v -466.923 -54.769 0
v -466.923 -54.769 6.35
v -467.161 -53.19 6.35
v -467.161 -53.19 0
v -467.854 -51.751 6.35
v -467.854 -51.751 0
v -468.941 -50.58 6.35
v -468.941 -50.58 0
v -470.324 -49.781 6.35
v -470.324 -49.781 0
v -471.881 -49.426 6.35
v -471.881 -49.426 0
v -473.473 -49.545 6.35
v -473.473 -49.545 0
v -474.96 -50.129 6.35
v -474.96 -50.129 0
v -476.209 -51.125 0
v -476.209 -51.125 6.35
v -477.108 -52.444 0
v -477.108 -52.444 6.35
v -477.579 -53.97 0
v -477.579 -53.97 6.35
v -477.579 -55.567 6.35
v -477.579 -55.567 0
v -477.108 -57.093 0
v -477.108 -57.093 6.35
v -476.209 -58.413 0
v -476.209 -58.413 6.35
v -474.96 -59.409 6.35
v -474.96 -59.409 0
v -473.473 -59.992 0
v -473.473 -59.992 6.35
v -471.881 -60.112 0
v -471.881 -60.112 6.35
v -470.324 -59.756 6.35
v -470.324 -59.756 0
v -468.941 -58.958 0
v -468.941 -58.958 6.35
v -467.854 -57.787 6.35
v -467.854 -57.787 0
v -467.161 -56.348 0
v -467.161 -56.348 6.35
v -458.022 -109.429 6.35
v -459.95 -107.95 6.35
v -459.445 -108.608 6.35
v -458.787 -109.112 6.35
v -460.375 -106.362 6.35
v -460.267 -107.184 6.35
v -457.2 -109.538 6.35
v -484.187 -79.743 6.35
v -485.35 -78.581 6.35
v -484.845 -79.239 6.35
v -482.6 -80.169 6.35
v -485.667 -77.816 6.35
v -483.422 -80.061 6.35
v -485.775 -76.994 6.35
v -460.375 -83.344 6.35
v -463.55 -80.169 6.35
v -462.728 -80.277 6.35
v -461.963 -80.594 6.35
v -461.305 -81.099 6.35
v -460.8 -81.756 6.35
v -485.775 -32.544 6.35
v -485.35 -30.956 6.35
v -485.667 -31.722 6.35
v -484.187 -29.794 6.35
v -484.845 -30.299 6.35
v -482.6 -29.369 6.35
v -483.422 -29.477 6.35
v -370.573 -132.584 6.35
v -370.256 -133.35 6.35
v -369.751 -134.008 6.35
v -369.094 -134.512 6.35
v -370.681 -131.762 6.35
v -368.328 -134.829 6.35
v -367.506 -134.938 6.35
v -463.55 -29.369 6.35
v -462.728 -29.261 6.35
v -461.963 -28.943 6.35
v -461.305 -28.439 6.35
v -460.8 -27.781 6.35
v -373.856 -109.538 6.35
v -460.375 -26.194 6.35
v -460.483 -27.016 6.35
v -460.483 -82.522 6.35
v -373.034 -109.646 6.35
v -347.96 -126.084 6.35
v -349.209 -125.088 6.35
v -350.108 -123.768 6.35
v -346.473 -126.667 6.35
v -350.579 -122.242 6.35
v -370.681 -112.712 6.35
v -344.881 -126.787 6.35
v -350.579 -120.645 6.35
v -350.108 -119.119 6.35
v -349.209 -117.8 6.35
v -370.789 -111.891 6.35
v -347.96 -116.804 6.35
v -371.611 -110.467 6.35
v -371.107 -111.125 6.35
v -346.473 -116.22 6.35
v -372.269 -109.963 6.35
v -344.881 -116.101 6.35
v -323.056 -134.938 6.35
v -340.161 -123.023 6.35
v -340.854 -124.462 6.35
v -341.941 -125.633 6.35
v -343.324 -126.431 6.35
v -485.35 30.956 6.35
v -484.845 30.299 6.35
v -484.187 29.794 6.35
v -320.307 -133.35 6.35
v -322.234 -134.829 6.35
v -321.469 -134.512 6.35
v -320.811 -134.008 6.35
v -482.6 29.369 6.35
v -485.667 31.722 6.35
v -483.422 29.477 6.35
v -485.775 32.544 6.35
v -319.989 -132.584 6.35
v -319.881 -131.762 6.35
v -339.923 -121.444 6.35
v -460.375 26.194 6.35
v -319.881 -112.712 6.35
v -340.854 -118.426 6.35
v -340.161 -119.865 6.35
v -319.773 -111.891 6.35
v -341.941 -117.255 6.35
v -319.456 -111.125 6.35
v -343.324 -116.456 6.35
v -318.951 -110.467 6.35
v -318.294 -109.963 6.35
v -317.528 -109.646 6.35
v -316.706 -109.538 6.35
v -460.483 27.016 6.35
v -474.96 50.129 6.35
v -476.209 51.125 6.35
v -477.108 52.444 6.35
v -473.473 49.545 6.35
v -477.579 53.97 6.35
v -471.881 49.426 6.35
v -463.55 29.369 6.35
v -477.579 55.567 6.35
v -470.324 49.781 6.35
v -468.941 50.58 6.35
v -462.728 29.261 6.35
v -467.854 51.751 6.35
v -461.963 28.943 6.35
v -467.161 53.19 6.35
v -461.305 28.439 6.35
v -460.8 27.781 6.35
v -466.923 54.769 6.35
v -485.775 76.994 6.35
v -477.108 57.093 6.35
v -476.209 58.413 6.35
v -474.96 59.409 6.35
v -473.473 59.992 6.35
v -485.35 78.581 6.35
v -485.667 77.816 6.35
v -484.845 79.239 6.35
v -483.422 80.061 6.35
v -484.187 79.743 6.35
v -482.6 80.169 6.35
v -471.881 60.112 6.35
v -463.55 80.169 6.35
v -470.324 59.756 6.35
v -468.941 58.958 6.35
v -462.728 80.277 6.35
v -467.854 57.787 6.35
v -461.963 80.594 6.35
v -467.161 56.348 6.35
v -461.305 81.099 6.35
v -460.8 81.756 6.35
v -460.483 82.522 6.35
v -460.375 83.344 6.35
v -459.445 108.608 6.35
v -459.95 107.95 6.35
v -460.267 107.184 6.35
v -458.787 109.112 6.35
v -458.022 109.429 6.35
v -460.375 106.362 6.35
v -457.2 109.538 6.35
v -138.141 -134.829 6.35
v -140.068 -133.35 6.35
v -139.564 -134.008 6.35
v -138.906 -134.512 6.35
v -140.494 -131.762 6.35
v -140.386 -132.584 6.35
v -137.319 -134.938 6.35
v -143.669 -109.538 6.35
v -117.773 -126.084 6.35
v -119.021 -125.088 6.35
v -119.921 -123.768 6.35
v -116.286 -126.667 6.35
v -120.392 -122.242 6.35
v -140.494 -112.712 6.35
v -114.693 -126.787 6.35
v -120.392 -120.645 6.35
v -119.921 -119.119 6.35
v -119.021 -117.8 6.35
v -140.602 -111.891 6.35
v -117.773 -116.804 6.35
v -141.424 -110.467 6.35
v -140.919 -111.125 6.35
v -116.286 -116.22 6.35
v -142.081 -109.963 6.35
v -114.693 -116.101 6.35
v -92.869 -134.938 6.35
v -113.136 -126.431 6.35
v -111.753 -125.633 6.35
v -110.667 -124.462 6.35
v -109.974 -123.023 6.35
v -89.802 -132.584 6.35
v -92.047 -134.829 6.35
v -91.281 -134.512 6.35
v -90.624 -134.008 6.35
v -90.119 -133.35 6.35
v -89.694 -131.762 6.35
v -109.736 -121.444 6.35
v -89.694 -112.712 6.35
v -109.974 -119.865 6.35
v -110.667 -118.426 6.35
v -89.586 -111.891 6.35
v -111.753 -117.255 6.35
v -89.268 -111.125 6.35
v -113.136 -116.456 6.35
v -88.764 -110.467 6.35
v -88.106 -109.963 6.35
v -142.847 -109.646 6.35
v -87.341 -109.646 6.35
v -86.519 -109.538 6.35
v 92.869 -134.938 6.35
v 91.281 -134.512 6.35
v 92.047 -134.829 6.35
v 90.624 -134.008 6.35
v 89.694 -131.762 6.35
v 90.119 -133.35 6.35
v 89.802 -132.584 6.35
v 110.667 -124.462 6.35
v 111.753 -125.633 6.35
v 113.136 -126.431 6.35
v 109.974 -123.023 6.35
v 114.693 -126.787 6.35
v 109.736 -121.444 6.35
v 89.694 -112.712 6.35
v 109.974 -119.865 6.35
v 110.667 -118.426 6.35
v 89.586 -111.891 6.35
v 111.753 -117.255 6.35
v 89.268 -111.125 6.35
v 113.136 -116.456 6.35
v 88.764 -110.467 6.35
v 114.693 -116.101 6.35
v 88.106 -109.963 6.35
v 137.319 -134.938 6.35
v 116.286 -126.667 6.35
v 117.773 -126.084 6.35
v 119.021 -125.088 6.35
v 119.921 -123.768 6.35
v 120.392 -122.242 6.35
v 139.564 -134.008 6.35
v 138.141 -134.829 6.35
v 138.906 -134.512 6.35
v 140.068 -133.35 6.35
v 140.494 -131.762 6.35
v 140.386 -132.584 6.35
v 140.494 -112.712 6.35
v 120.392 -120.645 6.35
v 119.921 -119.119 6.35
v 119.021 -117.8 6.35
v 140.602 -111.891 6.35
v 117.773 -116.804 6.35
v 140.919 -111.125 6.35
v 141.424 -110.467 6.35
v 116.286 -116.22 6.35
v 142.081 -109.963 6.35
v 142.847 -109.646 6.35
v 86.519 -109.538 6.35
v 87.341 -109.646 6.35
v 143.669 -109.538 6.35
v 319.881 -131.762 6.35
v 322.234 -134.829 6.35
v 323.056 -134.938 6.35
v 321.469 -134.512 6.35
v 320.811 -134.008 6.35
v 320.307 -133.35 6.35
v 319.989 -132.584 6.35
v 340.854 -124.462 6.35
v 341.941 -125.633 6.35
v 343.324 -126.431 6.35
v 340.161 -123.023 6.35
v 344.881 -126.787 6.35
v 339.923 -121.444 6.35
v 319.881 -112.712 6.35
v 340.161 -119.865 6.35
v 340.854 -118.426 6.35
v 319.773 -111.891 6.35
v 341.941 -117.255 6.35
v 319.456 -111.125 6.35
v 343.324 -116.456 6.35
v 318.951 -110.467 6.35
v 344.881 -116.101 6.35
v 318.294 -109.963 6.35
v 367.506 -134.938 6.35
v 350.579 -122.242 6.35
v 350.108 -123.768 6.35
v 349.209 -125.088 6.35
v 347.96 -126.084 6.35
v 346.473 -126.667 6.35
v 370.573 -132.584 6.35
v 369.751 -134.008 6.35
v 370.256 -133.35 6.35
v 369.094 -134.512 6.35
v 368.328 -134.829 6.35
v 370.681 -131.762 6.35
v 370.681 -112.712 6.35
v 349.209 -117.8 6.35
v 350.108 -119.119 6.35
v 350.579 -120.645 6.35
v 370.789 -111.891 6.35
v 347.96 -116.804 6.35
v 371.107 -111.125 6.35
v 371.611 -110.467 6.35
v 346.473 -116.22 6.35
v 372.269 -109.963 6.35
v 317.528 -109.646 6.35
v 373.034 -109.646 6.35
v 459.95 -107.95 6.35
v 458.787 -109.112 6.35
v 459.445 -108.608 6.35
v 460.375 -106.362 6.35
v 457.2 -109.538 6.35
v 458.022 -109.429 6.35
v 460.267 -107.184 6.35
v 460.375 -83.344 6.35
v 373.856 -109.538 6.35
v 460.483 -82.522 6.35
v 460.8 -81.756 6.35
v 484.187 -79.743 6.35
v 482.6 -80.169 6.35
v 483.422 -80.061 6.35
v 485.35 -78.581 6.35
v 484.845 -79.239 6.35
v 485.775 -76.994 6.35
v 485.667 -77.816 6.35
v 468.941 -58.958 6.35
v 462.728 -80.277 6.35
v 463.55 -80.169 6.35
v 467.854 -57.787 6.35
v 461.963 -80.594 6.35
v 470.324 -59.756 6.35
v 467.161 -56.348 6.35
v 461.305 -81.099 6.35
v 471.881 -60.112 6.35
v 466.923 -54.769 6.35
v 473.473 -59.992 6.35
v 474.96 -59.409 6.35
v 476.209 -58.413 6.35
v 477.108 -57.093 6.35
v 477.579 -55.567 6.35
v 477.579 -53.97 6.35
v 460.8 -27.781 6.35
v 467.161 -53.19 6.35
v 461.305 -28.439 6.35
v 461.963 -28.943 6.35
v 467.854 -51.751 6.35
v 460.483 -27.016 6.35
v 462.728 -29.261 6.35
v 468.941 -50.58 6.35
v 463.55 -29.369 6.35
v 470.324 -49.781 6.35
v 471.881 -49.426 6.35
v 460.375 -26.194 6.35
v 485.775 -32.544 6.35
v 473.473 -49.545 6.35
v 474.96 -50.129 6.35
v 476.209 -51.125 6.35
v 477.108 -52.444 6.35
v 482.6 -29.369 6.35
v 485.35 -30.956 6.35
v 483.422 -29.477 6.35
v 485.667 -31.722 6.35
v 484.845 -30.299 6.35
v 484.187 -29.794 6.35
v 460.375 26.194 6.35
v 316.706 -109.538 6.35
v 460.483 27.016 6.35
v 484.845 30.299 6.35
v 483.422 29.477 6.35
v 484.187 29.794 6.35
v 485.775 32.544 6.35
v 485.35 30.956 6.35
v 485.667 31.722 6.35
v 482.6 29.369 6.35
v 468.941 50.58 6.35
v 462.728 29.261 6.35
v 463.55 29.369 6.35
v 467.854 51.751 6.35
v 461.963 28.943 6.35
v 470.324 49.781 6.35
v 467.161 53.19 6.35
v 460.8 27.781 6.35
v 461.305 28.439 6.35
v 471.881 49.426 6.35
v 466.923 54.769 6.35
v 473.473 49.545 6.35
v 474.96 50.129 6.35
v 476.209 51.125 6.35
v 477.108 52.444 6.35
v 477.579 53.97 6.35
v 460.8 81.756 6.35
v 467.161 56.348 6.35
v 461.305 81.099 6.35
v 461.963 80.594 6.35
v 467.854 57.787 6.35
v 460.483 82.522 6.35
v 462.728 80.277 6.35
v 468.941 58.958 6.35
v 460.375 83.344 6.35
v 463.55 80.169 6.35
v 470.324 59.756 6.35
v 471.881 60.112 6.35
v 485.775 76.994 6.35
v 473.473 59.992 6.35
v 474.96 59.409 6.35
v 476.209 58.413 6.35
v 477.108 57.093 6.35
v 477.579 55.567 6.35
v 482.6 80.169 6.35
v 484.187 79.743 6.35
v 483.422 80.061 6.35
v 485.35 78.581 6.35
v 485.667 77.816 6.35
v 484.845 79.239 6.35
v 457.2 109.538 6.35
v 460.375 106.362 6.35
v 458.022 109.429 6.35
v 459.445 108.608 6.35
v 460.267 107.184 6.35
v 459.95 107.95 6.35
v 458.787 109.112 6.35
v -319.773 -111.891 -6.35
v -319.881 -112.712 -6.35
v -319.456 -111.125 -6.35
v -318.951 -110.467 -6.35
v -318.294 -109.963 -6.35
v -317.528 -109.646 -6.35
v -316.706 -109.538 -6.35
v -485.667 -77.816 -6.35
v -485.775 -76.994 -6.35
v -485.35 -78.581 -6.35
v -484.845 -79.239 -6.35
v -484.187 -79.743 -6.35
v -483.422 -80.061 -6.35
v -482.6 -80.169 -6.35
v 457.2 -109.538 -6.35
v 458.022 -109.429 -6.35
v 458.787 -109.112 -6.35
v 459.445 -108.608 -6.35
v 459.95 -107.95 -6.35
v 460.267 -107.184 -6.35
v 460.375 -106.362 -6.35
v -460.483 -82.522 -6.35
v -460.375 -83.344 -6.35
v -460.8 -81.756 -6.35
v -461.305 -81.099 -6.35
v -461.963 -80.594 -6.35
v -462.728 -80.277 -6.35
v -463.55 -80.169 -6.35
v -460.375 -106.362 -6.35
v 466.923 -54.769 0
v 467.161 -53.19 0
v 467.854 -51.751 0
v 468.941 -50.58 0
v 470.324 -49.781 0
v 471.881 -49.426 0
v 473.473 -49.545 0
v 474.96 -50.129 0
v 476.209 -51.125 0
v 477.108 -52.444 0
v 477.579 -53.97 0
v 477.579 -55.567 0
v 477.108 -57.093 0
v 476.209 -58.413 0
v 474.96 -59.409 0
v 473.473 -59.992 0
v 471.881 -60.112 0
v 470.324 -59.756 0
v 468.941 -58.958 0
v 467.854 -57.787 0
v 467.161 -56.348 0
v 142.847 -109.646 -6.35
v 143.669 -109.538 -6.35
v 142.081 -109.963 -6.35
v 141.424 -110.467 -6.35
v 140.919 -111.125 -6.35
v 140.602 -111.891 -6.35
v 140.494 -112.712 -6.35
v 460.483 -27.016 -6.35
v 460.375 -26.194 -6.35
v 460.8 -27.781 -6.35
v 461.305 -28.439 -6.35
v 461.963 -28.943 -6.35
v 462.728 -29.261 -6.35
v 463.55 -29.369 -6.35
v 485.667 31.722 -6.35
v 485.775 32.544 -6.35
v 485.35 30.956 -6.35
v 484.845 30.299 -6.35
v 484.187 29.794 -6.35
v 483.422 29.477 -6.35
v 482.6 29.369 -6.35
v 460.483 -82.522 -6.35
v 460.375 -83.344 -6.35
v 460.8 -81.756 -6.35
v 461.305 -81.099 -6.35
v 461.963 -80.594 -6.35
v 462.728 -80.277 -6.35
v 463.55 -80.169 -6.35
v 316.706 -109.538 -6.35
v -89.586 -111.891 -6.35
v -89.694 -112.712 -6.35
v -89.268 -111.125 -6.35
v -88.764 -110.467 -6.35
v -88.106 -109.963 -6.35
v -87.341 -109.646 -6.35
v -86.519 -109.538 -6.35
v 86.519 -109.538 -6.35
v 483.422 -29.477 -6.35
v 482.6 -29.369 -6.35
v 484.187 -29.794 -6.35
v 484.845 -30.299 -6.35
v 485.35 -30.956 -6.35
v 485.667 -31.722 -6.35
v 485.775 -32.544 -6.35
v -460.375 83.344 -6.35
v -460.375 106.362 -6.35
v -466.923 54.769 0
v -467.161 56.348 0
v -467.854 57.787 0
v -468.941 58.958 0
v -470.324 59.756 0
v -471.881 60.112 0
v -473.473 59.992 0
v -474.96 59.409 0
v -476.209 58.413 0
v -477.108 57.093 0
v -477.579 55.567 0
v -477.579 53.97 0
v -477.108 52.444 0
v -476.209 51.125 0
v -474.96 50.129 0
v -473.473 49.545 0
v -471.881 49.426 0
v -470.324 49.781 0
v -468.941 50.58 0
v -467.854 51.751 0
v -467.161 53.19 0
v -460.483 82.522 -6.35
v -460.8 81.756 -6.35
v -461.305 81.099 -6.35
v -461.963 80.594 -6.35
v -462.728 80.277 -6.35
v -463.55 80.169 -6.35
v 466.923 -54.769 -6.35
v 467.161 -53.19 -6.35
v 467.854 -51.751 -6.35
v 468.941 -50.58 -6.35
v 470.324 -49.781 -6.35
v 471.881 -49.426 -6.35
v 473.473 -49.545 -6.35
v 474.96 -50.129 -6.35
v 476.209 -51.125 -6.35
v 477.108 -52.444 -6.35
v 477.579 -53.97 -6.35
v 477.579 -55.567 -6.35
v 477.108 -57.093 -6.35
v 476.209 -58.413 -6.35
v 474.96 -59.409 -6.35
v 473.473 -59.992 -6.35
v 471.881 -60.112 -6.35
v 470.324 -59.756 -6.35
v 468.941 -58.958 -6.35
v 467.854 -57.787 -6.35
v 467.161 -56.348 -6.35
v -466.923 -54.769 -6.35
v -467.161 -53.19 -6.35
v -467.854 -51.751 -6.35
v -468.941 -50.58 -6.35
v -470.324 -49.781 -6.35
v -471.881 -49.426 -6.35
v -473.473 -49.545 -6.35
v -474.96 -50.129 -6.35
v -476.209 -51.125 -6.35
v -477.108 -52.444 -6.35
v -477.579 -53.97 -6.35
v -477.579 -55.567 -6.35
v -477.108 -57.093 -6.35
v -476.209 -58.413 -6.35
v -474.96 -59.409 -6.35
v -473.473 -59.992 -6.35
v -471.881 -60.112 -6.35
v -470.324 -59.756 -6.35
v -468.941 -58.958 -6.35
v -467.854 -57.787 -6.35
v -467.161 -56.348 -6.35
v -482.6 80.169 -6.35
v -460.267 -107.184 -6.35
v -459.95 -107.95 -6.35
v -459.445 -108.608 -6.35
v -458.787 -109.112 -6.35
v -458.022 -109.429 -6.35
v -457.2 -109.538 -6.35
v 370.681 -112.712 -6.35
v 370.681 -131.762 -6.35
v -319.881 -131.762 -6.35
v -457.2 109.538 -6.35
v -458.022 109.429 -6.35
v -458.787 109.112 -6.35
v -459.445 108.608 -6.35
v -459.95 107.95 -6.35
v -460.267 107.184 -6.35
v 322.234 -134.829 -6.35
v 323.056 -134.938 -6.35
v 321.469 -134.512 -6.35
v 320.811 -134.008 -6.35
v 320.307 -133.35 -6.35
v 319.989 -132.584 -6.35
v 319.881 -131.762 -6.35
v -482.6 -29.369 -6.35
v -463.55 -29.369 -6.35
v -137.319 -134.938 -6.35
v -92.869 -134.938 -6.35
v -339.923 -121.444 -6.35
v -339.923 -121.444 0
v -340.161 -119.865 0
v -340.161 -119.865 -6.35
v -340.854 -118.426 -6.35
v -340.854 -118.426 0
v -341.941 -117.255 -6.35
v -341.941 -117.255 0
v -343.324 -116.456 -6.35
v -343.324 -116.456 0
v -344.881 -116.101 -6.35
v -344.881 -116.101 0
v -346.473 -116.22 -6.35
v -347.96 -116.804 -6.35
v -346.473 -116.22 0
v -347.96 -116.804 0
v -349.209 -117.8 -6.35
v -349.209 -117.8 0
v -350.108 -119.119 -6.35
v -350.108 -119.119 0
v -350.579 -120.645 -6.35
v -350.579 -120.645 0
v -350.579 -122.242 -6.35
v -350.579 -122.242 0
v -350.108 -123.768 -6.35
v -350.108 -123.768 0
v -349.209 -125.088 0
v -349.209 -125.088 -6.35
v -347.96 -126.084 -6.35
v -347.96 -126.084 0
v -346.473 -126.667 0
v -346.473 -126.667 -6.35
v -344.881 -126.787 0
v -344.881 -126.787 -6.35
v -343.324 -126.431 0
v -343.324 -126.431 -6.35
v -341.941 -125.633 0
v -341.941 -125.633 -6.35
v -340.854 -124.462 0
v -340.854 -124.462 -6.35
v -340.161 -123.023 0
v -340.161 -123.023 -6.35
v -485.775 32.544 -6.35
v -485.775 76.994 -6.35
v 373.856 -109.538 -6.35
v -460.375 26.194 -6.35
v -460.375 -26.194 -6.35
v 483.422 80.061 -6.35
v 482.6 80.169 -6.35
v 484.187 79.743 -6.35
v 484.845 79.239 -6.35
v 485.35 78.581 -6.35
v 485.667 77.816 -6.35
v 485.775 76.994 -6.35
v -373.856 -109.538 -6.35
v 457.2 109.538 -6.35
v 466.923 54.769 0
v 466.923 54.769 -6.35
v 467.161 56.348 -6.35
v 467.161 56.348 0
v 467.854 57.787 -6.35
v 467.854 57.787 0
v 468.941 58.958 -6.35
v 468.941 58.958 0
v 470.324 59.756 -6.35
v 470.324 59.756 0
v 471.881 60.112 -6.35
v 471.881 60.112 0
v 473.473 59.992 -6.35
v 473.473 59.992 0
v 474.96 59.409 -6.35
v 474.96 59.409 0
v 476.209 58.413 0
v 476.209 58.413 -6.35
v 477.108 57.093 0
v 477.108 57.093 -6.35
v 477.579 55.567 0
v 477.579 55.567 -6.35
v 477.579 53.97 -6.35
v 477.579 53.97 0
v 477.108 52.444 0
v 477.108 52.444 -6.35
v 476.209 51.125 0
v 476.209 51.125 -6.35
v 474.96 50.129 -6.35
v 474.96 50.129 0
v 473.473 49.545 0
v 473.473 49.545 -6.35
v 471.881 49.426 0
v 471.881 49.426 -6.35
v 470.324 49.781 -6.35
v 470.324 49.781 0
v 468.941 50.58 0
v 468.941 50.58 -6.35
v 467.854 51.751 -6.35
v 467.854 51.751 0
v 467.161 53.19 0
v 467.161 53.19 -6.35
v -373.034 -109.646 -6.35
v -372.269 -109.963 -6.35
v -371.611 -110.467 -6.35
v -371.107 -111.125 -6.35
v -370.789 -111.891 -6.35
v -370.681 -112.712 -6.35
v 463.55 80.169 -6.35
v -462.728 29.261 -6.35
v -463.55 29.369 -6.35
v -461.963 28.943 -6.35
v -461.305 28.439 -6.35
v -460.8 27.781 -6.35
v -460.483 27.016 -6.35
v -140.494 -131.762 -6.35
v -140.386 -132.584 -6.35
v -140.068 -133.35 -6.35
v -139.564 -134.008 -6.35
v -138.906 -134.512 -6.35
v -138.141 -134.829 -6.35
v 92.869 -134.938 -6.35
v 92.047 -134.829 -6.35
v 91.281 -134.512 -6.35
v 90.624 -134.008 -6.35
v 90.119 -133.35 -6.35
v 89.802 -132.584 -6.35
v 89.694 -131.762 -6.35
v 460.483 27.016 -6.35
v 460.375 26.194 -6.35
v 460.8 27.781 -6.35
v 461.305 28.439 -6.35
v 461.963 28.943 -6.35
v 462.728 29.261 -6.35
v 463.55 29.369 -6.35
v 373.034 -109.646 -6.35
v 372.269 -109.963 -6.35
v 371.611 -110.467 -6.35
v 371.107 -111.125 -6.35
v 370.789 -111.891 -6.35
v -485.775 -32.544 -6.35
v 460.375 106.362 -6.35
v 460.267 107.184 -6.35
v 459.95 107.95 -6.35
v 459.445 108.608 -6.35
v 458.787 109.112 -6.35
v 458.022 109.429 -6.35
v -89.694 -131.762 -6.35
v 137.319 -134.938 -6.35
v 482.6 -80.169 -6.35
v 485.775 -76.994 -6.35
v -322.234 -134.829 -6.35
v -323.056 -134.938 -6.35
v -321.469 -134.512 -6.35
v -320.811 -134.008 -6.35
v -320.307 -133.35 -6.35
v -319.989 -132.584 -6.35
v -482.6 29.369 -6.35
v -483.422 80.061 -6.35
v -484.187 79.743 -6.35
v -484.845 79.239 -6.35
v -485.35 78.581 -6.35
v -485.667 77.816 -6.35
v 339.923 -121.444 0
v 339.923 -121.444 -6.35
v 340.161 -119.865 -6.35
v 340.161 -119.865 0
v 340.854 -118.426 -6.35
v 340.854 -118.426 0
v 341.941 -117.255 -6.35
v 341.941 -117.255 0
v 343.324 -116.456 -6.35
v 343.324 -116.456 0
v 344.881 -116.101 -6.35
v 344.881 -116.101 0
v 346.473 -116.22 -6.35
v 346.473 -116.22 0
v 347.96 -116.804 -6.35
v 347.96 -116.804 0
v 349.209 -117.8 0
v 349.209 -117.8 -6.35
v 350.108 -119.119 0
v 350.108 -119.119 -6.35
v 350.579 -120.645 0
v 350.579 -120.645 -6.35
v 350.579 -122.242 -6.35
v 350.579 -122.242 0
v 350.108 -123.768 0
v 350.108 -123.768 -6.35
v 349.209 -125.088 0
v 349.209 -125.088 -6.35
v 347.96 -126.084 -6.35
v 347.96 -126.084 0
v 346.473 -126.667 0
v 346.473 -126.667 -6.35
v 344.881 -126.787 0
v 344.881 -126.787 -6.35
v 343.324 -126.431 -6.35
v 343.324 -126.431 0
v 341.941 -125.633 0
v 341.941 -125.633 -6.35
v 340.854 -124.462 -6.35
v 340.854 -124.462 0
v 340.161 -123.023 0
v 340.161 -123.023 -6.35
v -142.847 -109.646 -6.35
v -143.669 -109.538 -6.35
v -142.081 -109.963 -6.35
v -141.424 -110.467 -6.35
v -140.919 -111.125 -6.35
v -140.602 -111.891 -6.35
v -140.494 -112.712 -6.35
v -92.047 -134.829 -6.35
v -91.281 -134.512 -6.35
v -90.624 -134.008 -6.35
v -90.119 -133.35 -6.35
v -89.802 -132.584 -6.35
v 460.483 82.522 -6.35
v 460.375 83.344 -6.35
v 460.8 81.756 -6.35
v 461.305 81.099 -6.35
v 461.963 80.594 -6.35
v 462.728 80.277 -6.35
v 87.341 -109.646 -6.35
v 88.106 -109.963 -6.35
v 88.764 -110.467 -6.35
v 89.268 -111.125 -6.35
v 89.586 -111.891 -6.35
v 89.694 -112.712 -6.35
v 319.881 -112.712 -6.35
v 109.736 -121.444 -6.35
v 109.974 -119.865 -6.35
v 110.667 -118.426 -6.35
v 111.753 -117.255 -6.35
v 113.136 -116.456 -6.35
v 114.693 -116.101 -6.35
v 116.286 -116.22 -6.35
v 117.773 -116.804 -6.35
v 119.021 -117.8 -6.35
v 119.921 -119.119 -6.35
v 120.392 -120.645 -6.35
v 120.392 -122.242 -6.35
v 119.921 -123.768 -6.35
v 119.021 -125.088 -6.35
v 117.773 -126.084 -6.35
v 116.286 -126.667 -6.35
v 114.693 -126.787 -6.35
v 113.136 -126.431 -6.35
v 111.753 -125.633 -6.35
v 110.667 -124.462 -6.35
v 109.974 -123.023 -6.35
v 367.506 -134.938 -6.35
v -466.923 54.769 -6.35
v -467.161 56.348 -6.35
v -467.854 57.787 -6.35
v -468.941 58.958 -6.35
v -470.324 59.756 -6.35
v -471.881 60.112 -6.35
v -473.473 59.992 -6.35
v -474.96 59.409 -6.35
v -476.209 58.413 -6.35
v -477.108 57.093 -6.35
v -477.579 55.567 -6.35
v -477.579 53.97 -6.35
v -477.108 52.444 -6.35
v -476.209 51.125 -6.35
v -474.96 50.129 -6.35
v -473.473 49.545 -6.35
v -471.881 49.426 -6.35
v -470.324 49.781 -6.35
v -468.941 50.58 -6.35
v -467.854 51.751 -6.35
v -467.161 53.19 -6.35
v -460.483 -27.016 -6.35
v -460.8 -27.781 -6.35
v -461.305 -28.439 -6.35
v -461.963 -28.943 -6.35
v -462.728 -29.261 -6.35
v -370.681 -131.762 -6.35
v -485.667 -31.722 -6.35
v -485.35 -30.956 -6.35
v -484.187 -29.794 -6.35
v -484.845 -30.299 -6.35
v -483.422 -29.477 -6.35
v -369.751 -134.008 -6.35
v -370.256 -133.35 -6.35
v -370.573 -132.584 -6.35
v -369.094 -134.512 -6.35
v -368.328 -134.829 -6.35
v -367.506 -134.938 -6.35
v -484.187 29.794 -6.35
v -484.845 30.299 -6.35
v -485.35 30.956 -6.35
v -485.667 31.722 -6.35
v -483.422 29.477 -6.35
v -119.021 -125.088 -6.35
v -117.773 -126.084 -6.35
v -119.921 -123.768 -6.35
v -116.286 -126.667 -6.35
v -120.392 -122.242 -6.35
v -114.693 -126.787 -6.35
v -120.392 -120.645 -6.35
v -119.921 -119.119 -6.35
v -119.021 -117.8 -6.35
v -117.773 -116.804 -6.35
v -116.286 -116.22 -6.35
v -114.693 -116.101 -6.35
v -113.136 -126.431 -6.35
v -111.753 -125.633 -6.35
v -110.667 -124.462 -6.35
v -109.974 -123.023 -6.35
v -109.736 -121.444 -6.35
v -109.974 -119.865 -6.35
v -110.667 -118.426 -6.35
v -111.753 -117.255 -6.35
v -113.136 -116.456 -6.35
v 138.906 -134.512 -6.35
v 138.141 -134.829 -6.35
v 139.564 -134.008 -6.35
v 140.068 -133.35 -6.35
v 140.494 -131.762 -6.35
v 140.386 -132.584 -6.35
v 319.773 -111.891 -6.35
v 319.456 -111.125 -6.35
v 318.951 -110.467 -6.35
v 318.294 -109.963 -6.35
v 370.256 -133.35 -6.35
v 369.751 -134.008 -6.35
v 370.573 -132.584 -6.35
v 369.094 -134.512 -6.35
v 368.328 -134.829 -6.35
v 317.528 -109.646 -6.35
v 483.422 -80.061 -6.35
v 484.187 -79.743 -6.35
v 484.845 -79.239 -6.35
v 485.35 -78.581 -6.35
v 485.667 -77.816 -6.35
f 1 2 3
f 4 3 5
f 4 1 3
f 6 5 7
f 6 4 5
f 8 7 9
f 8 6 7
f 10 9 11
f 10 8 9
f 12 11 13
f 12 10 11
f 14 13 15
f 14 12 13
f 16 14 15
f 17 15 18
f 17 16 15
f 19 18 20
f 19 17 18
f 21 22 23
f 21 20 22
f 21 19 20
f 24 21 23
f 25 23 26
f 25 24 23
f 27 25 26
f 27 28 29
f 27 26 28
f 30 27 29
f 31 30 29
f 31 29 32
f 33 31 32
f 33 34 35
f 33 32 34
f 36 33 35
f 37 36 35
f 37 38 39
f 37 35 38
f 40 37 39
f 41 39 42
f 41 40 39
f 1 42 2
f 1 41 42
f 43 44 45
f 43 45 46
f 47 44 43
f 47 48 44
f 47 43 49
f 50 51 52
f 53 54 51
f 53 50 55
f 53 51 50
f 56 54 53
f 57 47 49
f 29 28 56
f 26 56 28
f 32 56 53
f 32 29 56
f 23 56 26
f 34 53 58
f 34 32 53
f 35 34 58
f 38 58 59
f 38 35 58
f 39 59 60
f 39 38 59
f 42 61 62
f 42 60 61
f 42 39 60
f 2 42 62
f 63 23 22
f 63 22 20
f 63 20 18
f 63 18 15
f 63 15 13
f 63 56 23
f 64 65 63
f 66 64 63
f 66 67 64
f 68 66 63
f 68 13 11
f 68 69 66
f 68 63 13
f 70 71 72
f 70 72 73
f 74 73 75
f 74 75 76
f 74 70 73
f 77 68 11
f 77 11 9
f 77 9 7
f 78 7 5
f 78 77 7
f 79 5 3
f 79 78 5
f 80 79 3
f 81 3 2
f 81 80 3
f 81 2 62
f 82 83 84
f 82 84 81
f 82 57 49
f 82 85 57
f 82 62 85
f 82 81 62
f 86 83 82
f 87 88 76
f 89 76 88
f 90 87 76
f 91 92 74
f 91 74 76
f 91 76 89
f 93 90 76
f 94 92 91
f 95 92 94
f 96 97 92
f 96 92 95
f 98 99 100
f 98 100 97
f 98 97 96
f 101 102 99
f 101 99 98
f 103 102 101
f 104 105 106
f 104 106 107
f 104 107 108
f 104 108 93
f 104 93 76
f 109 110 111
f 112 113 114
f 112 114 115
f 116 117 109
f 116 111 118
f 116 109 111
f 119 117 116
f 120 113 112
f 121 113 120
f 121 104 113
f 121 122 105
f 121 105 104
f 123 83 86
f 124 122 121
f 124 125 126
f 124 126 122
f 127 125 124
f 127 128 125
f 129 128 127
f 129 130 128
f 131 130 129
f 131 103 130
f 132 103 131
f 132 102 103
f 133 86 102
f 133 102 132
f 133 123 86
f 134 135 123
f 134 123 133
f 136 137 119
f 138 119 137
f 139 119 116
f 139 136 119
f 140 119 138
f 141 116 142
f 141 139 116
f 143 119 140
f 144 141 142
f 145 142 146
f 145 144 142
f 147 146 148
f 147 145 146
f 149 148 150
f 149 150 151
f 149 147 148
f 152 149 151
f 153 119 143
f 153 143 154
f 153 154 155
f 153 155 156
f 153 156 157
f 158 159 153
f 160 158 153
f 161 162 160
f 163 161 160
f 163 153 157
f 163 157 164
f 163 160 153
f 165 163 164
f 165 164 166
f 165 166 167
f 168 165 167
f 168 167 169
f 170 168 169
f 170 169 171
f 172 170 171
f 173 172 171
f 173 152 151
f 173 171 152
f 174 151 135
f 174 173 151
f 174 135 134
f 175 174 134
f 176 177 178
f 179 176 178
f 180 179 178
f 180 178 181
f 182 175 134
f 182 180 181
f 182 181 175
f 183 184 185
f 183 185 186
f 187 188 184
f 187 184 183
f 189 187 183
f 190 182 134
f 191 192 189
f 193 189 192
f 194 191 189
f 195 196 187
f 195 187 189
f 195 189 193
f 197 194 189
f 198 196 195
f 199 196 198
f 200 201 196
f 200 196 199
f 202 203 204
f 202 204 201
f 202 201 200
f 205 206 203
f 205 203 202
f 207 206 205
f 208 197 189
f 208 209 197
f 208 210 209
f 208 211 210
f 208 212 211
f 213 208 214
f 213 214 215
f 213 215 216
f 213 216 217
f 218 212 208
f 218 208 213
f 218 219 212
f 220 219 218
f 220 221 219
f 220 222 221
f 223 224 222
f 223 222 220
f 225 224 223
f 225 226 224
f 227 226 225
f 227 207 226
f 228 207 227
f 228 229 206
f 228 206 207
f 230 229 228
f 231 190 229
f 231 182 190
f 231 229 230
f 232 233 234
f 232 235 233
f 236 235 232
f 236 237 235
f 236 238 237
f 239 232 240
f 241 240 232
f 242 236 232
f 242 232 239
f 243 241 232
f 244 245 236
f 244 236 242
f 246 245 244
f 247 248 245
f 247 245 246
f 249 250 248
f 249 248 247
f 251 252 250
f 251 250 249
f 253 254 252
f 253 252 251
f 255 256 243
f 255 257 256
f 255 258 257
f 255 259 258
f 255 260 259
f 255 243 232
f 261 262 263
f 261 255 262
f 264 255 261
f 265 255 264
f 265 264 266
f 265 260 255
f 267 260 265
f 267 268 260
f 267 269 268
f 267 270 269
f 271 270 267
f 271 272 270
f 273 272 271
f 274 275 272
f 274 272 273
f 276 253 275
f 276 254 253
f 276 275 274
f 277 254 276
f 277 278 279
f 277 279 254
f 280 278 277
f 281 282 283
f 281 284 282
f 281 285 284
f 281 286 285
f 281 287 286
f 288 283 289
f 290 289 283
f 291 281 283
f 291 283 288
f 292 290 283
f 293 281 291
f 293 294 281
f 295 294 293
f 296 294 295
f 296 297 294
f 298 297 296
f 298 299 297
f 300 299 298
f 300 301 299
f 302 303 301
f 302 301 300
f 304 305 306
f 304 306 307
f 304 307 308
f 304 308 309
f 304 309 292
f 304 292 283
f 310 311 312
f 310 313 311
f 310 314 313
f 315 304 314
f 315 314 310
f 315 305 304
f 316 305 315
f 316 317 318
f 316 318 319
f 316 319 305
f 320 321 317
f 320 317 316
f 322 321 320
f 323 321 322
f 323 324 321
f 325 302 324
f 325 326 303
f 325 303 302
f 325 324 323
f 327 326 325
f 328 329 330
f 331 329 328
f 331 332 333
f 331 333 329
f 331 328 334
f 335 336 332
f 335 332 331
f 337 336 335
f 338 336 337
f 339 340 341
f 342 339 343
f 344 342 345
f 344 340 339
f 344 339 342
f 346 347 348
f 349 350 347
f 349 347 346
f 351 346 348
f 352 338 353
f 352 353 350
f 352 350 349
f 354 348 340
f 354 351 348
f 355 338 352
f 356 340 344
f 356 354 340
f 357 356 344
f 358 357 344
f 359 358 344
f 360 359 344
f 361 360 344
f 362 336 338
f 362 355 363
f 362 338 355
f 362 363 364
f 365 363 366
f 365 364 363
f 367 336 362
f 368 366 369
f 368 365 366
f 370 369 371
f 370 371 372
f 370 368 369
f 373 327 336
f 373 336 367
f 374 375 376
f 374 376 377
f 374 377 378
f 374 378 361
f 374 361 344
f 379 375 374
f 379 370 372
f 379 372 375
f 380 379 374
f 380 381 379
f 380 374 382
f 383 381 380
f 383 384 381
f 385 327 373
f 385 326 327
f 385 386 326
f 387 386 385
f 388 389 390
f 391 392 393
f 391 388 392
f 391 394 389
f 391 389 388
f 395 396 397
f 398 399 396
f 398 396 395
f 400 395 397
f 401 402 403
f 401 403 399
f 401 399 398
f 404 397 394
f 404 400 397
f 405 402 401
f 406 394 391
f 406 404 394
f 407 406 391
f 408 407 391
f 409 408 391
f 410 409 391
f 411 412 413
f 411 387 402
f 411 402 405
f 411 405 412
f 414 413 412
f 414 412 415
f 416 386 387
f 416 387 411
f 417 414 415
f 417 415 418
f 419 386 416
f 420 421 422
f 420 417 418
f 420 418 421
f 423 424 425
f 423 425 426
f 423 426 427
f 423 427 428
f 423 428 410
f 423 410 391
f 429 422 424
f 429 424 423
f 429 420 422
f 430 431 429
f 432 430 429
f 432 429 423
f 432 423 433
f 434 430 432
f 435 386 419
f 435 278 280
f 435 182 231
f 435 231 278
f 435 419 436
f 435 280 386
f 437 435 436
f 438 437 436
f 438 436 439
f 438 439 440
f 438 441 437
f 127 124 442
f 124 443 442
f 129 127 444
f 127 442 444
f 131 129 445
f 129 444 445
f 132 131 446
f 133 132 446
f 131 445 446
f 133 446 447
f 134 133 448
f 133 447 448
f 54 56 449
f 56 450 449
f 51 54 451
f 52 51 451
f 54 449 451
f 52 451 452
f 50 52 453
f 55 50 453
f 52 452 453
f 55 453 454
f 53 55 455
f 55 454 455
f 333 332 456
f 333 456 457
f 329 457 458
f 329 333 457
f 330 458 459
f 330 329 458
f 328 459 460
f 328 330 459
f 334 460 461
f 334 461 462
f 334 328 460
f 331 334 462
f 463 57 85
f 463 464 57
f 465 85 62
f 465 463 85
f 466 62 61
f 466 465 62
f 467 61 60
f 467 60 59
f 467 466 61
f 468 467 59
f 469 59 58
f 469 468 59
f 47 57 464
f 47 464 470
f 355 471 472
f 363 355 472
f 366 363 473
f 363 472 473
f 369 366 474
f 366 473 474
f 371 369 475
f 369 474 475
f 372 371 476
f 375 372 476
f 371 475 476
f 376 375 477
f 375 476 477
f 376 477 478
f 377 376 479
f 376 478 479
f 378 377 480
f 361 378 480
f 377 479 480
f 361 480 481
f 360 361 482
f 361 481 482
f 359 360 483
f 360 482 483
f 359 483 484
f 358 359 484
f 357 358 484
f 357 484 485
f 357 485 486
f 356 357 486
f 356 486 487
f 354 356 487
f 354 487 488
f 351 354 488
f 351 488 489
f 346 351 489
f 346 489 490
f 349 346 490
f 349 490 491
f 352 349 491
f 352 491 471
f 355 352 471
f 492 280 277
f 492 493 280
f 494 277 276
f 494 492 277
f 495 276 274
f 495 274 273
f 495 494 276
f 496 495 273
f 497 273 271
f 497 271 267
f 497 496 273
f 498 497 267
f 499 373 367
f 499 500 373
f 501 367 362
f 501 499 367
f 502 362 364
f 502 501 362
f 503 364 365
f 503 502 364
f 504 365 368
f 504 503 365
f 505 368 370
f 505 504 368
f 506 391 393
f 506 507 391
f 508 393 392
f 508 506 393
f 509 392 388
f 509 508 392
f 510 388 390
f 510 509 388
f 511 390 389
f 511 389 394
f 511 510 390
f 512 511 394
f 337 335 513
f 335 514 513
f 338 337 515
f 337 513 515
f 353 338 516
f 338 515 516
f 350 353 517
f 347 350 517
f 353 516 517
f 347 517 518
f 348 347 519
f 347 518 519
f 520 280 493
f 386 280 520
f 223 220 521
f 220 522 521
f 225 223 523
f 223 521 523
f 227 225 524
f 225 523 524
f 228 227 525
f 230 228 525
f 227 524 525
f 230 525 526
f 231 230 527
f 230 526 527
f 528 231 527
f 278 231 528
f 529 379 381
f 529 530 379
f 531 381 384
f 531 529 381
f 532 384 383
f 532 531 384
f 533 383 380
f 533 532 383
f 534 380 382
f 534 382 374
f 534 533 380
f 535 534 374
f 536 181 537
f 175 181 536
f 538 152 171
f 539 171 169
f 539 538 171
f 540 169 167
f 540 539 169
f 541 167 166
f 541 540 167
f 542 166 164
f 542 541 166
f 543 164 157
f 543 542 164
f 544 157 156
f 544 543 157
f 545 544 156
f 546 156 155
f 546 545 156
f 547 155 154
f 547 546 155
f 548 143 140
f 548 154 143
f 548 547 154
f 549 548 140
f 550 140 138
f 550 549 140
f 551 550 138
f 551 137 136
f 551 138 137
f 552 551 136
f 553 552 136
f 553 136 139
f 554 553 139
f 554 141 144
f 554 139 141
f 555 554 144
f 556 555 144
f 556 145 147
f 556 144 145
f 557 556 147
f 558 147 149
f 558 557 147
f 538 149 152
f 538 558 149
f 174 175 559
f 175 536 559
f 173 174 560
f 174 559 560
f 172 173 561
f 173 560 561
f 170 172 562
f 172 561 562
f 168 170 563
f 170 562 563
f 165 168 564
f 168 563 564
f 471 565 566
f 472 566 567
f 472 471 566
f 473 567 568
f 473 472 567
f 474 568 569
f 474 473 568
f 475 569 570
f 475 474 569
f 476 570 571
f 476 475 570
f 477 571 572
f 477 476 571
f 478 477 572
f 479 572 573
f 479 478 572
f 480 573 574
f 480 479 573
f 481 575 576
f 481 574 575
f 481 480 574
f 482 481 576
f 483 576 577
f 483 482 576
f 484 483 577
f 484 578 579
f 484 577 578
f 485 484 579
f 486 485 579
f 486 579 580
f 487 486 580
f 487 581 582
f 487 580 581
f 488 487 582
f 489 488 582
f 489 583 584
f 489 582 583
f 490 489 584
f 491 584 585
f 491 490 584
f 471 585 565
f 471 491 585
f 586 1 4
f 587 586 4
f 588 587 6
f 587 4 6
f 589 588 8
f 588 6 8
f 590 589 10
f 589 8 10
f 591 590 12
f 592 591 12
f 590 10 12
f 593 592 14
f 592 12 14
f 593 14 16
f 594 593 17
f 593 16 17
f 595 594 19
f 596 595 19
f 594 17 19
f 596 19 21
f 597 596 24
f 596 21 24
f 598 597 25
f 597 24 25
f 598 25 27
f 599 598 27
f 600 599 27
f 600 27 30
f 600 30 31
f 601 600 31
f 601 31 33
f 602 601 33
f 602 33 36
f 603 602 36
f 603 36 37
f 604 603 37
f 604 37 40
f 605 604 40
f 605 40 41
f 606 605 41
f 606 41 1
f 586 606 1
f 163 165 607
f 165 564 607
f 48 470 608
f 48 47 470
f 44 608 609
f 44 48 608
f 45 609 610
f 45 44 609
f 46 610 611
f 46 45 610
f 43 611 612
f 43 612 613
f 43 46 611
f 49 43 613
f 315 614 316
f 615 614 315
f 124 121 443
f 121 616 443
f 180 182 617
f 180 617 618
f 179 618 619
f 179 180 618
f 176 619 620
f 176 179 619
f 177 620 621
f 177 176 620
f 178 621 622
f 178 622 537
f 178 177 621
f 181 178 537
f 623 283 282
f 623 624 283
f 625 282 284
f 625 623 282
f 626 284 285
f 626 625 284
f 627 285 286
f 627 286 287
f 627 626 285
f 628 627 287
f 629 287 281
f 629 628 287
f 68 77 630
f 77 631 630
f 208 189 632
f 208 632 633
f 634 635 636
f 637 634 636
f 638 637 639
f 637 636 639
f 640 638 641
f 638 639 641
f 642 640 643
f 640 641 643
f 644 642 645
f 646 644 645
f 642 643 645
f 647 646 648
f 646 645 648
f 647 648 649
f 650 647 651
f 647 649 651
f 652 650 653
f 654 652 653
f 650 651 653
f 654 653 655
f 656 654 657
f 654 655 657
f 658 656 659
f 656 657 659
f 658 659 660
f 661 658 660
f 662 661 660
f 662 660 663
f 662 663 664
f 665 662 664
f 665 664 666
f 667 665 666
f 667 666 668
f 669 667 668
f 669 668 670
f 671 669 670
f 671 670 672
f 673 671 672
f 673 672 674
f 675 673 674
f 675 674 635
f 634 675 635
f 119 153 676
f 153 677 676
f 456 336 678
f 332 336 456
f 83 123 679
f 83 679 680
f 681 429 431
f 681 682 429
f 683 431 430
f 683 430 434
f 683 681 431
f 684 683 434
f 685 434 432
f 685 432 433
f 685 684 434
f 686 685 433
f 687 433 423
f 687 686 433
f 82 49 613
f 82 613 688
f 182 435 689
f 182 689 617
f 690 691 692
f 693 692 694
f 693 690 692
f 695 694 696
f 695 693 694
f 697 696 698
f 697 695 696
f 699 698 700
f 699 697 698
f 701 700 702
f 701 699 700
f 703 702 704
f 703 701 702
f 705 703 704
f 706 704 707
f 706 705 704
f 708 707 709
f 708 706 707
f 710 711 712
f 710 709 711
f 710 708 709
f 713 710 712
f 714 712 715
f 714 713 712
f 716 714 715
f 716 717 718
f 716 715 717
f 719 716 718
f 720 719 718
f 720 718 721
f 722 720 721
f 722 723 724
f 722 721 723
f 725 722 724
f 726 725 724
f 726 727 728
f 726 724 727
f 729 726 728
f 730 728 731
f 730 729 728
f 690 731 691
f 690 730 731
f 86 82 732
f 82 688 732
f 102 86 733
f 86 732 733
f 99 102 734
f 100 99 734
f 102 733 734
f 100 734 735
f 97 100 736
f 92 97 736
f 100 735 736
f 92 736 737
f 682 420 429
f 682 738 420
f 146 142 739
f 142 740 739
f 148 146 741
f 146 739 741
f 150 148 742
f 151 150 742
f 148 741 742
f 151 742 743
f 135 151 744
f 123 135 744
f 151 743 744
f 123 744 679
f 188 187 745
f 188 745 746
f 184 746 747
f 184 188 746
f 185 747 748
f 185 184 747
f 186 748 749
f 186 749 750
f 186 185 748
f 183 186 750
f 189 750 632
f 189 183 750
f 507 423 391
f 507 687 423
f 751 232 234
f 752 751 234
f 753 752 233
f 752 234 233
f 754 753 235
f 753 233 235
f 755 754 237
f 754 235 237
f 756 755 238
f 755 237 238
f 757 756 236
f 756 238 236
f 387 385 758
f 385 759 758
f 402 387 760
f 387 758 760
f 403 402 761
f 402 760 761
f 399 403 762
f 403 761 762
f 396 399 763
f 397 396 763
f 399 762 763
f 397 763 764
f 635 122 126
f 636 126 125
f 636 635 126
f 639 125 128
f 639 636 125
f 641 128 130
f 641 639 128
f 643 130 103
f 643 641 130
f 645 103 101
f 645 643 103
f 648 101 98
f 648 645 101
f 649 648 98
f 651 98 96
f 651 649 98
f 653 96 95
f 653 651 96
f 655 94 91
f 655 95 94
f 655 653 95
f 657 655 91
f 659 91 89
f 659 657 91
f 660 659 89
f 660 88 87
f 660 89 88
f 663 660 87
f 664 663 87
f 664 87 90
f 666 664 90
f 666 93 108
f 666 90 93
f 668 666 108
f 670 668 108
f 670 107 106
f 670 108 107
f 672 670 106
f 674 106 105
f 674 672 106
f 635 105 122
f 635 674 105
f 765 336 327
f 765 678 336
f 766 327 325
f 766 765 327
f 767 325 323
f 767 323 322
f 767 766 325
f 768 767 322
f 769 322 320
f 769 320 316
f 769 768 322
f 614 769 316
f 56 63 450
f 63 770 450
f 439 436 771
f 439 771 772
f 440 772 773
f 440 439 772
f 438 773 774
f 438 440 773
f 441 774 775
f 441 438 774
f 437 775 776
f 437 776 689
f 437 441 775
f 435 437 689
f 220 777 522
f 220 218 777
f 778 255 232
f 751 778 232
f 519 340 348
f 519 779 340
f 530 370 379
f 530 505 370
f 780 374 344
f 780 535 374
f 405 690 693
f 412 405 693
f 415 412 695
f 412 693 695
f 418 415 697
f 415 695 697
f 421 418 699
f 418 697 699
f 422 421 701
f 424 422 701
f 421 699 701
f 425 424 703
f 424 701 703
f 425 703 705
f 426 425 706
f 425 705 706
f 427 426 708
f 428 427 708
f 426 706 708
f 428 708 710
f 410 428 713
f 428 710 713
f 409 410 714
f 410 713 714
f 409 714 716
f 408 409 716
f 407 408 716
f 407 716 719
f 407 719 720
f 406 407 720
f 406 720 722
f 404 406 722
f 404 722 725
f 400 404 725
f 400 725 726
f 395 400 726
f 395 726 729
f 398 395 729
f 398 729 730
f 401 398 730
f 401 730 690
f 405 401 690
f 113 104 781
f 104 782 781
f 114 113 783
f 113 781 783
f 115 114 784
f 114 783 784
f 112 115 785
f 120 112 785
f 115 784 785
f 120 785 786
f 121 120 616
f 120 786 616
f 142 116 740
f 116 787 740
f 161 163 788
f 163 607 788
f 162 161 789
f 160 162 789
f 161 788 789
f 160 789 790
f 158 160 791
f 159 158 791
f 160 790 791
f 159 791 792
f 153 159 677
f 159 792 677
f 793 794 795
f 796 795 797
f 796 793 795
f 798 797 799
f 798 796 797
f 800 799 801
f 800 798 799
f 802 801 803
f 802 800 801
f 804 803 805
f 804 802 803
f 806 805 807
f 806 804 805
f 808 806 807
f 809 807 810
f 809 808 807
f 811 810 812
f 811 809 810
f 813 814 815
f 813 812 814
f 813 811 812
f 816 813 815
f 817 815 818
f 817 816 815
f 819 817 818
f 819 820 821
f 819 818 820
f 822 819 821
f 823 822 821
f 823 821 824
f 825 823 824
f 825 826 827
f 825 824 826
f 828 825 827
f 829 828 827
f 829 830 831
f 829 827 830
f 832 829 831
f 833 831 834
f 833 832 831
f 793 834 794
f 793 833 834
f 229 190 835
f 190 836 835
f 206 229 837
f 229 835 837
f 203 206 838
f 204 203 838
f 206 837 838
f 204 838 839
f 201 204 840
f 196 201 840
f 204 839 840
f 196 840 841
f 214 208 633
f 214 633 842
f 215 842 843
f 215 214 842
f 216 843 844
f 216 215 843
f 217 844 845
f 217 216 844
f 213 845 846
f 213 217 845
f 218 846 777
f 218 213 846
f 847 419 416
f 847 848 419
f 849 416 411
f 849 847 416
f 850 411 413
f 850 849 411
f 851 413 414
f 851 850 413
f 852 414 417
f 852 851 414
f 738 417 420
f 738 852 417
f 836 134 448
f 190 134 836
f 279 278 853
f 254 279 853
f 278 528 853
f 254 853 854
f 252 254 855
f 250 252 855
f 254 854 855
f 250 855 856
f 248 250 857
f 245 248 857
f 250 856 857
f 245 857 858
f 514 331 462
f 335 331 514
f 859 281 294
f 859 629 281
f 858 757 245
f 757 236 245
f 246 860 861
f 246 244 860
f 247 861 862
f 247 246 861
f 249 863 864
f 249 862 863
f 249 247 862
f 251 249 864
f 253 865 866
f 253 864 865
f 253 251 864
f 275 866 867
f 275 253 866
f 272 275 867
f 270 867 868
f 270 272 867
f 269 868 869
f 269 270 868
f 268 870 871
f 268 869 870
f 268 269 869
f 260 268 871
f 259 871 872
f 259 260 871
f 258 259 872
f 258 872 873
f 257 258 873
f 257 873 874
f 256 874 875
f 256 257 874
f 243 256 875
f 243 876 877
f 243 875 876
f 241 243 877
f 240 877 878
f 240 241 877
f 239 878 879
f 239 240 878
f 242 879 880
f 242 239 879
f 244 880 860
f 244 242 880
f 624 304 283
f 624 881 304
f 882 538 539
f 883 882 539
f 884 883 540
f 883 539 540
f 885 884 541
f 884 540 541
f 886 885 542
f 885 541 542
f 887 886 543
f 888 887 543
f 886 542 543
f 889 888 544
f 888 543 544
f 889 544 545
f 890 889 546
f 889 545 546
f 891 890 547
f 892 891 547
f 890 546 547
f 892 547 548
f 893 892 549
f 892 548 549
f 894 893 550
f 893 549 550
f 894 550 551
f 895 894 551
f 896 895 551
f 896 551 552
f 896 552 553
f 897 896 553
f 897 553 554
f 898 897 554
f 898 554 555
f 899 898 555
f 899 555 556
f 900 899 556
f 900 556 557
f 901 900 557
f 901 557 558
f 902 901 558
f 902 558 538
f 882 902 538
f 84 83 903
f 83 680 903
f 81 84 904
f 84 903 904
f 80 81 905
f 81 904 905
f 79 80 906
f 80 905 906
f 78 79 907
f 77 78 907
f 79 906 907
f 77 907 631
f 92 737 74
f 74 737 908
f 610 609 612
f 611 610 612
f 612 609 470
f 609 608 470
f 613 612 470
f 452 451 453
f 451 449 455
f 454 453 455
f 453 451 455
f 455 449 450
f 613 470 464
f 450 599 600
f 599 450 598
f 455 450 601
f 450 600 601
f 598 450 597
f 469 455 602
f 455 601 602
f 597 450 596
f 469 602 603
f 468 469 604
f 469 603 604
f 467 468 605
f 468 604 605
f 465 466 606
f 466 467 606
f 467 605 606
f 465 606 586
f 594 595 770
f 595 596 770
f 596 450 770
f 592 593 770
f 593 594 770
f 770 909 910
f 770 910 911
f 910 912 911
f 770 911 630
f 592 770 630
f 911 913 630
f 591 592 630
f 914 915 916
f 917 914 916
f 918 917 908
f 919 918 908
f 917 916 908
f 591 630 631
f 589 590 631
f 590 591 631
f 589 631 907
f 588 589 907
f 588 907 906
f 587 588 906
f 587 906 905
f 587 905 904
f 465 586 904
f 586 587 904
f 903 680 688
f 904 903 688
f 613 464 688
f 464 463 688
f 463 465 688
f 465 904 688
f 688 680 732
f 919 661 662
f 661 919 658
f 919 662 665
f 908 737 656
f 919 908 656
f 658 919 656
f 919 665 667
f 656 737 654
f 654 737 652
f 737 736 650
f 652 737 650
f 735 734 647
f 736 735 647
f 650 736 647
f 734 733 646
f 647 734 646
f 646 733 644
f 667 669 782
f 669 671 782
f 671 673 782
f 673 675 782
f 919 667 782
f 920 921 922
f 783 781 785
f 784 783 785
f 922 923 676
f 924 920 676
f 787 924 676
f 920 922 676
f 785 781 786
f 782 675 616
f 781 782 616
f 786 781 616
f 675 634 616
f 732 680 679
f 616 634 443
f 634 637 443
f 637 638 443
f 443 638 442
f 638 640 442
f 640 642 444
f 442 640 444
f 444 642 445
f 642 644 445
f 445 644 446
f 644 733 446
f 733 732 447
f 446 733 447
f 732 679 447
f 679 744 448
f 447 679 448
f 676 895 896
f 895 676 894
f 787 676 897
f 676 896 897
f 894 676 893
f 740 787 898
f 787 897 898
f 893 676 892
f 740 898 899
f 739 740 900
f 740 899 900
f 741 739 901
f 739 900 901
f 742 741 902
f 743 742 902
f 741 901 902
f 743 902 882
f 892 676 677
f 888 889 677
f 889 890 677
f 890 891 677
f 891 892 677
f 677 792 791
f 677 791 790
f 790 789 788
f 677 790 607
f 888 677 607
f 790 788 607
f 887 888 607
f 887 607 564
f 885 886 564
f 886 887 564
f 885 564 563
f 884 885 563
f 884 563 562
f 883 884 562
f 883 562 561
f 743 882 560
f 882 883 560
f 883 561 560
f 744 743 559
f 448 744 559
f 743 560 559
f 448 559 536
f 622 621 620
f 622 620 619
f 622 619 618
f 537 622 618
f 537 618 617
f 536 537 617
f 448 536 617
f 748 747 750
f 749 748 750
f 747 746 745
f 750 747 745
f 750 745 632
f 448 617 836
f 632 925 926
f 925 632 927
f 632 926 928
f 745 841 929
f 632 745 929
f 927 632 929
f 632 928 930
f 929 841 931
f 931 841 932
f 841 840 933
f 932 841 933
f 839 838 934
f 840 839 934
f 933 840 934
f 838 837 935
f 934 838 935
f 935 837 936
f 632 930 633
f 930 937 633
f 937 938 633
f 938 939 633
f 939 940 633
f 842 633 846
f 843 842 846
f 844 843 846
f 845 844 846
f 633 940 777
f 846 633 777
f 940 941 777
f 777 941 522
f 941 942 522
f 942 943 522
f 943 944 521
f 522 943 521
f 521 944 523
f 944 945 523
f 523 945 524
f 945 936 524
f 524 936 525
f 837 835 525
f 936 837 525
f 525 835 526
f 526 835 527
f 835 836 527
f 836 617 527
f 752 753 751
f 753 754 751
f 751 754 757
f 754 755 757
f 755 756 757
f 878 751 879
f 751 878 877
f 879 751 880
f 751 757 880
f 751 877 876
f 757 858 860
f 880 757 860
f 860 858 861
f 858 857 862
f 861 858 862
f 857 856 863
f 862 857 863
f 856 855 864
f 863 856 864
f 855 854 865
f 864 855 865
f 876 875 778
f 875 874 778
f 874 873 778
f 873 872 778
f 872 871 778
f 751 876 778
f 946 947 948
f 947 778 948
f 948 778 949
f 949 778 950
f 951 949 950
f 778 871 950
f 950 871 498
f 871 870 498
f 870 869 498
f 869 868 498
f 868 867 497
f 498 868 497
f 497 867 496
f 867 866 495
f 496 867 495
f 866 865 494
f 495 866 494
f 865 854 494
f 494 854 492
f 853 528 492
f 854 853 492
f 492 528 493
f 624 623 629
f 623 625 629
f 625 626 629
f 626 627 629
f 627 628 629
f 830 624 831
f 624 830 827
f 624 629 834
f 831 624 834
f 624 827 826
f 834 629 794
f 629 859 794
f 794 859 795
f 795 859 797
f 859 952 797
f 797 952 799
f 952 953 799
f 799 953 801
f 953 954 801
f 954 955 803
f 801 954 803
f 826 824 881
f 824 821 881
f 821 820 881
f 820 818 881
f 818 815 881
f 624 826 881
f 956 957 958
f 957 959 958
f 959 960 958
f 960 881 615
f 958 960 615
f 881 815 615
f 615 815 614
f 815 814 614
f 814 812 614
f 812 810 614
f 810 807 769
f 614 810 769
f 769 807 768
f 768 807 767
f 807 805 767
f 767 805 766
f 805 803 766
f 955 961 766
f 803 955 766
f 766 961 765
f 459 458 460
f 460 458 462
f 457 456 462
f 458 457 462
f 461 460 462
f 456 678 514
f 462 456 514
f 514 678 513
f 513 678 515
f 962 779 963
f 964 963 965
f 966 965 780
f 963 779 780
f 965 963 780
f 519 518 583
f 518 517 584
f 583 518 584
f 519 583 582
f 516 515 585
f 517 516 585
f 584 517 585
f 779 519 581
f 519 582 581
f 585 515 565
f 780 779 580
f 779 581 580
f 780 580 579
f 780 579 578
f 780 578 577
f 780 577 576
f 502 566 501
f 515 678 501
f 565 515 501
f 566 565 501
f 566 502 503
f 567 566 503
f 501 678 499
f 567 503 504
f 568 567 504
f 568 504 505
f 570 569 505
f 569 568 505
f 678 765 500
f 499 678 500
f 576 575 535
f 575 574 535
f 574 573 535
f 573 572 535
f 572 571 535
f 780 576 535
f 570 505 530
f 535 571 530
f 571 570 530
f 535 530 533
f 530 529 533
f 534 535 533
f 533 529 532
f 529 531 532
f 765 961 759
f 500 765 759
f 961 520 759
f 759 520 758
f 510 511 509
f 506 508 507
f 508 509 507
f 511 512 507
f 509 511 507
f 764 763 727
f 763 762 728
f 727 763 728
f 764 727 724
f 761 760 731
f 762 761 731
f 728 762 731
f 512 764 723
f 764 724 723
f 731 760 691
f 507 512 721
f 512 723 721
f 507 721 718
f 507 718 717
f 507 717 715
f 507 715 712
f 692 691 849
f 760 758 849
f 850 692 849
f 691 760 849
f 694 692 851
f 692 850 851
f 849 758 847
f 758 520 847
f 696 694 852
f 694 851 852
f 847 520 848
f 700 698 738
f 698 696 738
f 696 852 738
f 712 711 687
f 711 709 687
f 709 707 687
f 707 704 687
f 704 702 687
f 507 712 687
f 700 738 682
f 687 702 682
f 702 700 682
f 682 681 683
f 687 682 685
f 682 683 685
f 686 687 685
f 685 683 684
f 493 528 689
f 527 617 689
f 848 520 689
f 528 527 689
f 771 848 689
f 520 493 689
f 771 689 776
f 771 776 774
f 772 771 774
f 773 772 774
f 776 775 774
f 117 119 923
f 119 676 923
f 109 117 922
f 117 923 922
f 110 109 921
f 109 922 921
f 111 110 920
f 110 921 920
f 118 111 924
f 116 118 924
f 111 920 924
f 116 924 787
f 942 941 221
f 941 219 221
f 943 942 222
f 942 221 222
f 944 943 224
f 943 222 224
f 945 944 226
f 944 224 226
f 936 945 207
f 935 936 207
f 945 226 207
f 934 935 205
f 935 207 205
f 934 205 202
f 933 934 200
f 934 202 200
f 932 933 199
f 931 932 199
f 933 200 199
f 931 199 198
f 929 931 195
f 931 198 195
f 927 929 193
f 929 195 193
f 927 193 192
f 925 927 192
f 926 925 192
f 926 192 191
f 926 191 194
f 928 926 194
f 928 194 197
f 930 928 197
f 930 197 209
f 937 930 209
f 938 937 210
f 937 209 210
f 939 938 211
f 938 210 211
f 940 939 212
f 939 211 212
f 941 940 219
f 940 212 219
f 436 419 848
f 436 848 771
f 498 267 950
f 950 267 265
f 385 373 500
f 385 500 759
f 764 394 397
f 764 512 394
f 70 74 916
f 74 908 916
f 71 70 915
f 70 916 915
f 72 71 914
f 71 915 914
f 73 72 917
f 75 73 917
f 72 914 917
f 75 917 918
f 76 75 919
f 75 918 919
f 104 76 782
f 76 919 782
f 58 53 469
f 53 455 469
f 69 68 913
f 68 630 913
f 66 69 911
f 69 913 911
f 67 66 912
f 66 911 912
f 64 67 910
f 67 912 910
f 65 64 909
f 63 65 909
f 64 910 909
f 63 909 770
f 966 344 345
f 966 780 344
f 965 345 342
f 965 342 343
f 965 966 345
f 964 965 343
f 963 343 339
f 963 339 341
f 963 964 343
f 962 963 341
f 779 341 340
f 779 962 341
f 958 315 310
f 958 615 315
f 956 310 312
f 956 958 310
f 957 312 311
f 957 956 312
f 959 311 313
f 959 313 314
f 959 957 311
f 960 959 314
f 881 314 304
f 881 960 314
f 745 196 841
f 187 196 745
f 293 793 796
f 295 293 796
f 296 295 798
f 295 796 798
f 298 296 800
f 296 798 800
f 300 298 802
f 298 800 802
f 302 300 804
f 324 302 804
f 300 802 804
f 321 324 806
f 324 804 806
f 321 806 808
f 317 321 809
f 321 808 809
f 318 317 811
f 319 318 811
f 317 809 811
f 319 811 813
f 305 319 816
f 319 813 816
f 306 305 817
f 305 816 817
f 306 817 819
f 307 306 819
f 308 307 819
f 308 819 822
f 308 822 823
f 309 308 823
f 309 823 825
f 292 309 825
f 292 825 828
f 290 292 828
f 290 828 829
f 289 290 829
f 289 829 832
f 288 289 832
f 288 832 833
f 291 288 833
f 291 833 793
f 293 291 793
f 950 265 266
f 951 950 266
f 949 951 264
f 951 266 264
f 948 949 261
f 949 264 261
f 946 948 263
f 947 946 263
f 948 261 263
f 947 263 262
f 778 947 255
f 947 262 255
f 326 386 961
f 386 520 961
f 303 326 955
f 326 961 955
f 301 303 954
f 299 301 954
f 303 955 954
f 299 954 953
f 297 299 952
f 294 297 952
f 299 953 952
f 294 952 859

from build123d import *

# Parameters (mm, degrees)
BOSS_EXTRUDE1_DEPTH  = 6.35
TABS_DEPTH           = 6.35
FILLET1_R            = 3.175
SKETCH3_R            = 5.3578125
CABLE_TIE_HOLE_DEPTH = 7.35


with BuildPart() as part:
    # Sketch1 → Boss-Extrude1 (new body, symmetric)
    with BuildSketch(Plane.XY):
        with BuildLine():
            Line((-457.2, -109.5375), (457.2, -109.5375))
            ThreePointArc((457.2, -109.5375), (459.44506403, -108.60756403), (460.375, -106.3625))
            Line((460.375, -106.3625), (460.375, 106.3625))
            ThreePointArc((460.375, 106.3625), (459.44506403, 108.60756403), (457.2, 109.5375))
            Line((457.2, 109.5375), (-457.2, 109.5375))
            ThreePointArc((-457.2, 109.5375), (-459.44506403, 108.60756403), (-460.375, 106.3625))
            Line((-460.375, 106.3625), (-460.375, -106.3625))
            ThreePointArc((-460.375, -106.3625), (-459.44506403, -108.60756403), (-457.2, -109.5375))
        make_face()
    extrude(amount=BOSS_EXTRUDE1_DEPTH, both=True)

    # Sketch2 → Tabs (add, symmetric)
    with BuildSketch(Plane.XY):
        with BuildLine():
            Line((-460.375, 80.16875), (-482.6, 80.16875))
            ThreePointArc((-482.6, 80.16875), (-484.84506403, 79.23881403), (-485.775, 76.99375))
            Line((-485.775, 76.99375), (-485.775, 32.54375))
            ThreePointArc((-485.775, 32.54375), (-484.84506403, 30.29868597), (-482.6, 29.36875))
            Line((-482.6, 29.36875), (-460.375, 29.36875))
            Line((-460.375, 29.36875), (-460.375, 80.16875))
        make_face()
        with BuildLine():
            Line((-460.375, -29.36875), (-482.6, -29.36875))
            ThreePointArc((-482.6, -29.36875), (-484.84506403, -30.29868597), (-485.775, -32.54375))
            Line((-485.775, -32.54375), (-485.775, -76.99375))
            ThreePointArc((-485.775, -76.99375), (-484.84506403, -79.23881403), (-482.6, -80.16875))
            Line((-482.6, -80.16875), (-460.375, -80.16875))
            Line((-460.375, -80.16875), (-460.375, -29.36875))
        make_face()
        with BuildLine():
            Line((-370.68125, -109.5375), (-370.68125, -131.7625))
            ThreePointArc((-370.68125, -131.7625), (-369.75131403, -134.00756403), (-367.50625, -134.9375))
            Line((-367.50625, -134.9375), (-323.05625, -134.9375))
            ThreePointArc((-323.05625, -134.9375), (-320.81118597, -134.00756403), (-319.88125, -131.7625))
            Line((-319.88125, -131.7625), (-319.88125, -109.5375))
            Line((-319.88125, -109.5375), (-370.68125, -109.5375))
        make_face()
        with BuildLine():
            Line((-140.49375, -109.5375), (-140.49375, -131.7625))
            ThreePointArc((-140.49375, -131.7625), (-139.56381403, -134.00756403), (-137.31875, -134.9375))
            Line((-137.31875, -134.9375), (-92.86875, -134.9375))
            ThreePointArc((-92.86875, -134.9375), (-90.62368597, -134.00756403), (-89.69375, -131.7625))
            Line((-89.69375, -131.7625), (-89.69375, -109.5375))
            Line((-89.69375, -109.5375), (-140.49375, -109.5375))
        make_face()
    tabs = extrude(amount=TABS_DEPTH, both=True)

    # Mirror1: Tabs across plane
    add(tabs.mirror(Plane(origin=(0, 0, 0), x_dir=(0, 0, 1), z_dir=(1, 0, 0))))

    # Fillet1
    fillet1_edges = [part.edges().sort_by_distance(p)[0] for p in [
        (460.375, -29.36875, 0),
        (460.375, -80.16875, 0),
        (370.68125, -109.5375, 0),
        (319.88125, -109.5375, 0),
        (140.49375, -109.5375, 0),
        (89.69375, -109.5375, 0),
        (-460.375, 29.36875, 0),
        (-460.375, 80.16875, 0),
        (-460.375, -80.16875, 0),
        (-460.375, -29.36875, 0),
        (-319.88125, -109.5375, 0),
        (-370.68125, -109.5375, 0),
        (-89.69375, -109.5375, 0),
        (-140.49375, -109.5375, 0),
        (460.375, 80.16875, 0),
        (460.375, 29.36875, 0),
    ]]
    fillet(fillet1_edges, radius=FILLET1_R)

    # Sketch3 → Cable Tie hole (cut, symmetric)
    with BuildSketch(Plane.XY):
        with Locations((-472.28125, 54.76875)):
            Circle(SKETCH3_R)
        with Locations((-472.28125, -54.76875)):
            Circle(SKETCH3_R)
        with Locations((-345.28125, -121.44375)):
            Circle(SKETCH3_R)
        with Locations((-115.09375, -121.44375)):
            Circle(SKETCH3_R)
    cable_tie_hole = extrude(amount=CABLE_TIE_HOLE_DEPTH, both=True, mode=Mode.SUBTRACT)

    # Mirror2: Cable Tie hole across plane
    add(cable_tie_hole.mirror(Plane(origin=(0, 0, 0), x_dir=(0, 0, 1), z_dir=(1, 0, 0))), mode=Mode.SUBTRACT)


solid = part.part
